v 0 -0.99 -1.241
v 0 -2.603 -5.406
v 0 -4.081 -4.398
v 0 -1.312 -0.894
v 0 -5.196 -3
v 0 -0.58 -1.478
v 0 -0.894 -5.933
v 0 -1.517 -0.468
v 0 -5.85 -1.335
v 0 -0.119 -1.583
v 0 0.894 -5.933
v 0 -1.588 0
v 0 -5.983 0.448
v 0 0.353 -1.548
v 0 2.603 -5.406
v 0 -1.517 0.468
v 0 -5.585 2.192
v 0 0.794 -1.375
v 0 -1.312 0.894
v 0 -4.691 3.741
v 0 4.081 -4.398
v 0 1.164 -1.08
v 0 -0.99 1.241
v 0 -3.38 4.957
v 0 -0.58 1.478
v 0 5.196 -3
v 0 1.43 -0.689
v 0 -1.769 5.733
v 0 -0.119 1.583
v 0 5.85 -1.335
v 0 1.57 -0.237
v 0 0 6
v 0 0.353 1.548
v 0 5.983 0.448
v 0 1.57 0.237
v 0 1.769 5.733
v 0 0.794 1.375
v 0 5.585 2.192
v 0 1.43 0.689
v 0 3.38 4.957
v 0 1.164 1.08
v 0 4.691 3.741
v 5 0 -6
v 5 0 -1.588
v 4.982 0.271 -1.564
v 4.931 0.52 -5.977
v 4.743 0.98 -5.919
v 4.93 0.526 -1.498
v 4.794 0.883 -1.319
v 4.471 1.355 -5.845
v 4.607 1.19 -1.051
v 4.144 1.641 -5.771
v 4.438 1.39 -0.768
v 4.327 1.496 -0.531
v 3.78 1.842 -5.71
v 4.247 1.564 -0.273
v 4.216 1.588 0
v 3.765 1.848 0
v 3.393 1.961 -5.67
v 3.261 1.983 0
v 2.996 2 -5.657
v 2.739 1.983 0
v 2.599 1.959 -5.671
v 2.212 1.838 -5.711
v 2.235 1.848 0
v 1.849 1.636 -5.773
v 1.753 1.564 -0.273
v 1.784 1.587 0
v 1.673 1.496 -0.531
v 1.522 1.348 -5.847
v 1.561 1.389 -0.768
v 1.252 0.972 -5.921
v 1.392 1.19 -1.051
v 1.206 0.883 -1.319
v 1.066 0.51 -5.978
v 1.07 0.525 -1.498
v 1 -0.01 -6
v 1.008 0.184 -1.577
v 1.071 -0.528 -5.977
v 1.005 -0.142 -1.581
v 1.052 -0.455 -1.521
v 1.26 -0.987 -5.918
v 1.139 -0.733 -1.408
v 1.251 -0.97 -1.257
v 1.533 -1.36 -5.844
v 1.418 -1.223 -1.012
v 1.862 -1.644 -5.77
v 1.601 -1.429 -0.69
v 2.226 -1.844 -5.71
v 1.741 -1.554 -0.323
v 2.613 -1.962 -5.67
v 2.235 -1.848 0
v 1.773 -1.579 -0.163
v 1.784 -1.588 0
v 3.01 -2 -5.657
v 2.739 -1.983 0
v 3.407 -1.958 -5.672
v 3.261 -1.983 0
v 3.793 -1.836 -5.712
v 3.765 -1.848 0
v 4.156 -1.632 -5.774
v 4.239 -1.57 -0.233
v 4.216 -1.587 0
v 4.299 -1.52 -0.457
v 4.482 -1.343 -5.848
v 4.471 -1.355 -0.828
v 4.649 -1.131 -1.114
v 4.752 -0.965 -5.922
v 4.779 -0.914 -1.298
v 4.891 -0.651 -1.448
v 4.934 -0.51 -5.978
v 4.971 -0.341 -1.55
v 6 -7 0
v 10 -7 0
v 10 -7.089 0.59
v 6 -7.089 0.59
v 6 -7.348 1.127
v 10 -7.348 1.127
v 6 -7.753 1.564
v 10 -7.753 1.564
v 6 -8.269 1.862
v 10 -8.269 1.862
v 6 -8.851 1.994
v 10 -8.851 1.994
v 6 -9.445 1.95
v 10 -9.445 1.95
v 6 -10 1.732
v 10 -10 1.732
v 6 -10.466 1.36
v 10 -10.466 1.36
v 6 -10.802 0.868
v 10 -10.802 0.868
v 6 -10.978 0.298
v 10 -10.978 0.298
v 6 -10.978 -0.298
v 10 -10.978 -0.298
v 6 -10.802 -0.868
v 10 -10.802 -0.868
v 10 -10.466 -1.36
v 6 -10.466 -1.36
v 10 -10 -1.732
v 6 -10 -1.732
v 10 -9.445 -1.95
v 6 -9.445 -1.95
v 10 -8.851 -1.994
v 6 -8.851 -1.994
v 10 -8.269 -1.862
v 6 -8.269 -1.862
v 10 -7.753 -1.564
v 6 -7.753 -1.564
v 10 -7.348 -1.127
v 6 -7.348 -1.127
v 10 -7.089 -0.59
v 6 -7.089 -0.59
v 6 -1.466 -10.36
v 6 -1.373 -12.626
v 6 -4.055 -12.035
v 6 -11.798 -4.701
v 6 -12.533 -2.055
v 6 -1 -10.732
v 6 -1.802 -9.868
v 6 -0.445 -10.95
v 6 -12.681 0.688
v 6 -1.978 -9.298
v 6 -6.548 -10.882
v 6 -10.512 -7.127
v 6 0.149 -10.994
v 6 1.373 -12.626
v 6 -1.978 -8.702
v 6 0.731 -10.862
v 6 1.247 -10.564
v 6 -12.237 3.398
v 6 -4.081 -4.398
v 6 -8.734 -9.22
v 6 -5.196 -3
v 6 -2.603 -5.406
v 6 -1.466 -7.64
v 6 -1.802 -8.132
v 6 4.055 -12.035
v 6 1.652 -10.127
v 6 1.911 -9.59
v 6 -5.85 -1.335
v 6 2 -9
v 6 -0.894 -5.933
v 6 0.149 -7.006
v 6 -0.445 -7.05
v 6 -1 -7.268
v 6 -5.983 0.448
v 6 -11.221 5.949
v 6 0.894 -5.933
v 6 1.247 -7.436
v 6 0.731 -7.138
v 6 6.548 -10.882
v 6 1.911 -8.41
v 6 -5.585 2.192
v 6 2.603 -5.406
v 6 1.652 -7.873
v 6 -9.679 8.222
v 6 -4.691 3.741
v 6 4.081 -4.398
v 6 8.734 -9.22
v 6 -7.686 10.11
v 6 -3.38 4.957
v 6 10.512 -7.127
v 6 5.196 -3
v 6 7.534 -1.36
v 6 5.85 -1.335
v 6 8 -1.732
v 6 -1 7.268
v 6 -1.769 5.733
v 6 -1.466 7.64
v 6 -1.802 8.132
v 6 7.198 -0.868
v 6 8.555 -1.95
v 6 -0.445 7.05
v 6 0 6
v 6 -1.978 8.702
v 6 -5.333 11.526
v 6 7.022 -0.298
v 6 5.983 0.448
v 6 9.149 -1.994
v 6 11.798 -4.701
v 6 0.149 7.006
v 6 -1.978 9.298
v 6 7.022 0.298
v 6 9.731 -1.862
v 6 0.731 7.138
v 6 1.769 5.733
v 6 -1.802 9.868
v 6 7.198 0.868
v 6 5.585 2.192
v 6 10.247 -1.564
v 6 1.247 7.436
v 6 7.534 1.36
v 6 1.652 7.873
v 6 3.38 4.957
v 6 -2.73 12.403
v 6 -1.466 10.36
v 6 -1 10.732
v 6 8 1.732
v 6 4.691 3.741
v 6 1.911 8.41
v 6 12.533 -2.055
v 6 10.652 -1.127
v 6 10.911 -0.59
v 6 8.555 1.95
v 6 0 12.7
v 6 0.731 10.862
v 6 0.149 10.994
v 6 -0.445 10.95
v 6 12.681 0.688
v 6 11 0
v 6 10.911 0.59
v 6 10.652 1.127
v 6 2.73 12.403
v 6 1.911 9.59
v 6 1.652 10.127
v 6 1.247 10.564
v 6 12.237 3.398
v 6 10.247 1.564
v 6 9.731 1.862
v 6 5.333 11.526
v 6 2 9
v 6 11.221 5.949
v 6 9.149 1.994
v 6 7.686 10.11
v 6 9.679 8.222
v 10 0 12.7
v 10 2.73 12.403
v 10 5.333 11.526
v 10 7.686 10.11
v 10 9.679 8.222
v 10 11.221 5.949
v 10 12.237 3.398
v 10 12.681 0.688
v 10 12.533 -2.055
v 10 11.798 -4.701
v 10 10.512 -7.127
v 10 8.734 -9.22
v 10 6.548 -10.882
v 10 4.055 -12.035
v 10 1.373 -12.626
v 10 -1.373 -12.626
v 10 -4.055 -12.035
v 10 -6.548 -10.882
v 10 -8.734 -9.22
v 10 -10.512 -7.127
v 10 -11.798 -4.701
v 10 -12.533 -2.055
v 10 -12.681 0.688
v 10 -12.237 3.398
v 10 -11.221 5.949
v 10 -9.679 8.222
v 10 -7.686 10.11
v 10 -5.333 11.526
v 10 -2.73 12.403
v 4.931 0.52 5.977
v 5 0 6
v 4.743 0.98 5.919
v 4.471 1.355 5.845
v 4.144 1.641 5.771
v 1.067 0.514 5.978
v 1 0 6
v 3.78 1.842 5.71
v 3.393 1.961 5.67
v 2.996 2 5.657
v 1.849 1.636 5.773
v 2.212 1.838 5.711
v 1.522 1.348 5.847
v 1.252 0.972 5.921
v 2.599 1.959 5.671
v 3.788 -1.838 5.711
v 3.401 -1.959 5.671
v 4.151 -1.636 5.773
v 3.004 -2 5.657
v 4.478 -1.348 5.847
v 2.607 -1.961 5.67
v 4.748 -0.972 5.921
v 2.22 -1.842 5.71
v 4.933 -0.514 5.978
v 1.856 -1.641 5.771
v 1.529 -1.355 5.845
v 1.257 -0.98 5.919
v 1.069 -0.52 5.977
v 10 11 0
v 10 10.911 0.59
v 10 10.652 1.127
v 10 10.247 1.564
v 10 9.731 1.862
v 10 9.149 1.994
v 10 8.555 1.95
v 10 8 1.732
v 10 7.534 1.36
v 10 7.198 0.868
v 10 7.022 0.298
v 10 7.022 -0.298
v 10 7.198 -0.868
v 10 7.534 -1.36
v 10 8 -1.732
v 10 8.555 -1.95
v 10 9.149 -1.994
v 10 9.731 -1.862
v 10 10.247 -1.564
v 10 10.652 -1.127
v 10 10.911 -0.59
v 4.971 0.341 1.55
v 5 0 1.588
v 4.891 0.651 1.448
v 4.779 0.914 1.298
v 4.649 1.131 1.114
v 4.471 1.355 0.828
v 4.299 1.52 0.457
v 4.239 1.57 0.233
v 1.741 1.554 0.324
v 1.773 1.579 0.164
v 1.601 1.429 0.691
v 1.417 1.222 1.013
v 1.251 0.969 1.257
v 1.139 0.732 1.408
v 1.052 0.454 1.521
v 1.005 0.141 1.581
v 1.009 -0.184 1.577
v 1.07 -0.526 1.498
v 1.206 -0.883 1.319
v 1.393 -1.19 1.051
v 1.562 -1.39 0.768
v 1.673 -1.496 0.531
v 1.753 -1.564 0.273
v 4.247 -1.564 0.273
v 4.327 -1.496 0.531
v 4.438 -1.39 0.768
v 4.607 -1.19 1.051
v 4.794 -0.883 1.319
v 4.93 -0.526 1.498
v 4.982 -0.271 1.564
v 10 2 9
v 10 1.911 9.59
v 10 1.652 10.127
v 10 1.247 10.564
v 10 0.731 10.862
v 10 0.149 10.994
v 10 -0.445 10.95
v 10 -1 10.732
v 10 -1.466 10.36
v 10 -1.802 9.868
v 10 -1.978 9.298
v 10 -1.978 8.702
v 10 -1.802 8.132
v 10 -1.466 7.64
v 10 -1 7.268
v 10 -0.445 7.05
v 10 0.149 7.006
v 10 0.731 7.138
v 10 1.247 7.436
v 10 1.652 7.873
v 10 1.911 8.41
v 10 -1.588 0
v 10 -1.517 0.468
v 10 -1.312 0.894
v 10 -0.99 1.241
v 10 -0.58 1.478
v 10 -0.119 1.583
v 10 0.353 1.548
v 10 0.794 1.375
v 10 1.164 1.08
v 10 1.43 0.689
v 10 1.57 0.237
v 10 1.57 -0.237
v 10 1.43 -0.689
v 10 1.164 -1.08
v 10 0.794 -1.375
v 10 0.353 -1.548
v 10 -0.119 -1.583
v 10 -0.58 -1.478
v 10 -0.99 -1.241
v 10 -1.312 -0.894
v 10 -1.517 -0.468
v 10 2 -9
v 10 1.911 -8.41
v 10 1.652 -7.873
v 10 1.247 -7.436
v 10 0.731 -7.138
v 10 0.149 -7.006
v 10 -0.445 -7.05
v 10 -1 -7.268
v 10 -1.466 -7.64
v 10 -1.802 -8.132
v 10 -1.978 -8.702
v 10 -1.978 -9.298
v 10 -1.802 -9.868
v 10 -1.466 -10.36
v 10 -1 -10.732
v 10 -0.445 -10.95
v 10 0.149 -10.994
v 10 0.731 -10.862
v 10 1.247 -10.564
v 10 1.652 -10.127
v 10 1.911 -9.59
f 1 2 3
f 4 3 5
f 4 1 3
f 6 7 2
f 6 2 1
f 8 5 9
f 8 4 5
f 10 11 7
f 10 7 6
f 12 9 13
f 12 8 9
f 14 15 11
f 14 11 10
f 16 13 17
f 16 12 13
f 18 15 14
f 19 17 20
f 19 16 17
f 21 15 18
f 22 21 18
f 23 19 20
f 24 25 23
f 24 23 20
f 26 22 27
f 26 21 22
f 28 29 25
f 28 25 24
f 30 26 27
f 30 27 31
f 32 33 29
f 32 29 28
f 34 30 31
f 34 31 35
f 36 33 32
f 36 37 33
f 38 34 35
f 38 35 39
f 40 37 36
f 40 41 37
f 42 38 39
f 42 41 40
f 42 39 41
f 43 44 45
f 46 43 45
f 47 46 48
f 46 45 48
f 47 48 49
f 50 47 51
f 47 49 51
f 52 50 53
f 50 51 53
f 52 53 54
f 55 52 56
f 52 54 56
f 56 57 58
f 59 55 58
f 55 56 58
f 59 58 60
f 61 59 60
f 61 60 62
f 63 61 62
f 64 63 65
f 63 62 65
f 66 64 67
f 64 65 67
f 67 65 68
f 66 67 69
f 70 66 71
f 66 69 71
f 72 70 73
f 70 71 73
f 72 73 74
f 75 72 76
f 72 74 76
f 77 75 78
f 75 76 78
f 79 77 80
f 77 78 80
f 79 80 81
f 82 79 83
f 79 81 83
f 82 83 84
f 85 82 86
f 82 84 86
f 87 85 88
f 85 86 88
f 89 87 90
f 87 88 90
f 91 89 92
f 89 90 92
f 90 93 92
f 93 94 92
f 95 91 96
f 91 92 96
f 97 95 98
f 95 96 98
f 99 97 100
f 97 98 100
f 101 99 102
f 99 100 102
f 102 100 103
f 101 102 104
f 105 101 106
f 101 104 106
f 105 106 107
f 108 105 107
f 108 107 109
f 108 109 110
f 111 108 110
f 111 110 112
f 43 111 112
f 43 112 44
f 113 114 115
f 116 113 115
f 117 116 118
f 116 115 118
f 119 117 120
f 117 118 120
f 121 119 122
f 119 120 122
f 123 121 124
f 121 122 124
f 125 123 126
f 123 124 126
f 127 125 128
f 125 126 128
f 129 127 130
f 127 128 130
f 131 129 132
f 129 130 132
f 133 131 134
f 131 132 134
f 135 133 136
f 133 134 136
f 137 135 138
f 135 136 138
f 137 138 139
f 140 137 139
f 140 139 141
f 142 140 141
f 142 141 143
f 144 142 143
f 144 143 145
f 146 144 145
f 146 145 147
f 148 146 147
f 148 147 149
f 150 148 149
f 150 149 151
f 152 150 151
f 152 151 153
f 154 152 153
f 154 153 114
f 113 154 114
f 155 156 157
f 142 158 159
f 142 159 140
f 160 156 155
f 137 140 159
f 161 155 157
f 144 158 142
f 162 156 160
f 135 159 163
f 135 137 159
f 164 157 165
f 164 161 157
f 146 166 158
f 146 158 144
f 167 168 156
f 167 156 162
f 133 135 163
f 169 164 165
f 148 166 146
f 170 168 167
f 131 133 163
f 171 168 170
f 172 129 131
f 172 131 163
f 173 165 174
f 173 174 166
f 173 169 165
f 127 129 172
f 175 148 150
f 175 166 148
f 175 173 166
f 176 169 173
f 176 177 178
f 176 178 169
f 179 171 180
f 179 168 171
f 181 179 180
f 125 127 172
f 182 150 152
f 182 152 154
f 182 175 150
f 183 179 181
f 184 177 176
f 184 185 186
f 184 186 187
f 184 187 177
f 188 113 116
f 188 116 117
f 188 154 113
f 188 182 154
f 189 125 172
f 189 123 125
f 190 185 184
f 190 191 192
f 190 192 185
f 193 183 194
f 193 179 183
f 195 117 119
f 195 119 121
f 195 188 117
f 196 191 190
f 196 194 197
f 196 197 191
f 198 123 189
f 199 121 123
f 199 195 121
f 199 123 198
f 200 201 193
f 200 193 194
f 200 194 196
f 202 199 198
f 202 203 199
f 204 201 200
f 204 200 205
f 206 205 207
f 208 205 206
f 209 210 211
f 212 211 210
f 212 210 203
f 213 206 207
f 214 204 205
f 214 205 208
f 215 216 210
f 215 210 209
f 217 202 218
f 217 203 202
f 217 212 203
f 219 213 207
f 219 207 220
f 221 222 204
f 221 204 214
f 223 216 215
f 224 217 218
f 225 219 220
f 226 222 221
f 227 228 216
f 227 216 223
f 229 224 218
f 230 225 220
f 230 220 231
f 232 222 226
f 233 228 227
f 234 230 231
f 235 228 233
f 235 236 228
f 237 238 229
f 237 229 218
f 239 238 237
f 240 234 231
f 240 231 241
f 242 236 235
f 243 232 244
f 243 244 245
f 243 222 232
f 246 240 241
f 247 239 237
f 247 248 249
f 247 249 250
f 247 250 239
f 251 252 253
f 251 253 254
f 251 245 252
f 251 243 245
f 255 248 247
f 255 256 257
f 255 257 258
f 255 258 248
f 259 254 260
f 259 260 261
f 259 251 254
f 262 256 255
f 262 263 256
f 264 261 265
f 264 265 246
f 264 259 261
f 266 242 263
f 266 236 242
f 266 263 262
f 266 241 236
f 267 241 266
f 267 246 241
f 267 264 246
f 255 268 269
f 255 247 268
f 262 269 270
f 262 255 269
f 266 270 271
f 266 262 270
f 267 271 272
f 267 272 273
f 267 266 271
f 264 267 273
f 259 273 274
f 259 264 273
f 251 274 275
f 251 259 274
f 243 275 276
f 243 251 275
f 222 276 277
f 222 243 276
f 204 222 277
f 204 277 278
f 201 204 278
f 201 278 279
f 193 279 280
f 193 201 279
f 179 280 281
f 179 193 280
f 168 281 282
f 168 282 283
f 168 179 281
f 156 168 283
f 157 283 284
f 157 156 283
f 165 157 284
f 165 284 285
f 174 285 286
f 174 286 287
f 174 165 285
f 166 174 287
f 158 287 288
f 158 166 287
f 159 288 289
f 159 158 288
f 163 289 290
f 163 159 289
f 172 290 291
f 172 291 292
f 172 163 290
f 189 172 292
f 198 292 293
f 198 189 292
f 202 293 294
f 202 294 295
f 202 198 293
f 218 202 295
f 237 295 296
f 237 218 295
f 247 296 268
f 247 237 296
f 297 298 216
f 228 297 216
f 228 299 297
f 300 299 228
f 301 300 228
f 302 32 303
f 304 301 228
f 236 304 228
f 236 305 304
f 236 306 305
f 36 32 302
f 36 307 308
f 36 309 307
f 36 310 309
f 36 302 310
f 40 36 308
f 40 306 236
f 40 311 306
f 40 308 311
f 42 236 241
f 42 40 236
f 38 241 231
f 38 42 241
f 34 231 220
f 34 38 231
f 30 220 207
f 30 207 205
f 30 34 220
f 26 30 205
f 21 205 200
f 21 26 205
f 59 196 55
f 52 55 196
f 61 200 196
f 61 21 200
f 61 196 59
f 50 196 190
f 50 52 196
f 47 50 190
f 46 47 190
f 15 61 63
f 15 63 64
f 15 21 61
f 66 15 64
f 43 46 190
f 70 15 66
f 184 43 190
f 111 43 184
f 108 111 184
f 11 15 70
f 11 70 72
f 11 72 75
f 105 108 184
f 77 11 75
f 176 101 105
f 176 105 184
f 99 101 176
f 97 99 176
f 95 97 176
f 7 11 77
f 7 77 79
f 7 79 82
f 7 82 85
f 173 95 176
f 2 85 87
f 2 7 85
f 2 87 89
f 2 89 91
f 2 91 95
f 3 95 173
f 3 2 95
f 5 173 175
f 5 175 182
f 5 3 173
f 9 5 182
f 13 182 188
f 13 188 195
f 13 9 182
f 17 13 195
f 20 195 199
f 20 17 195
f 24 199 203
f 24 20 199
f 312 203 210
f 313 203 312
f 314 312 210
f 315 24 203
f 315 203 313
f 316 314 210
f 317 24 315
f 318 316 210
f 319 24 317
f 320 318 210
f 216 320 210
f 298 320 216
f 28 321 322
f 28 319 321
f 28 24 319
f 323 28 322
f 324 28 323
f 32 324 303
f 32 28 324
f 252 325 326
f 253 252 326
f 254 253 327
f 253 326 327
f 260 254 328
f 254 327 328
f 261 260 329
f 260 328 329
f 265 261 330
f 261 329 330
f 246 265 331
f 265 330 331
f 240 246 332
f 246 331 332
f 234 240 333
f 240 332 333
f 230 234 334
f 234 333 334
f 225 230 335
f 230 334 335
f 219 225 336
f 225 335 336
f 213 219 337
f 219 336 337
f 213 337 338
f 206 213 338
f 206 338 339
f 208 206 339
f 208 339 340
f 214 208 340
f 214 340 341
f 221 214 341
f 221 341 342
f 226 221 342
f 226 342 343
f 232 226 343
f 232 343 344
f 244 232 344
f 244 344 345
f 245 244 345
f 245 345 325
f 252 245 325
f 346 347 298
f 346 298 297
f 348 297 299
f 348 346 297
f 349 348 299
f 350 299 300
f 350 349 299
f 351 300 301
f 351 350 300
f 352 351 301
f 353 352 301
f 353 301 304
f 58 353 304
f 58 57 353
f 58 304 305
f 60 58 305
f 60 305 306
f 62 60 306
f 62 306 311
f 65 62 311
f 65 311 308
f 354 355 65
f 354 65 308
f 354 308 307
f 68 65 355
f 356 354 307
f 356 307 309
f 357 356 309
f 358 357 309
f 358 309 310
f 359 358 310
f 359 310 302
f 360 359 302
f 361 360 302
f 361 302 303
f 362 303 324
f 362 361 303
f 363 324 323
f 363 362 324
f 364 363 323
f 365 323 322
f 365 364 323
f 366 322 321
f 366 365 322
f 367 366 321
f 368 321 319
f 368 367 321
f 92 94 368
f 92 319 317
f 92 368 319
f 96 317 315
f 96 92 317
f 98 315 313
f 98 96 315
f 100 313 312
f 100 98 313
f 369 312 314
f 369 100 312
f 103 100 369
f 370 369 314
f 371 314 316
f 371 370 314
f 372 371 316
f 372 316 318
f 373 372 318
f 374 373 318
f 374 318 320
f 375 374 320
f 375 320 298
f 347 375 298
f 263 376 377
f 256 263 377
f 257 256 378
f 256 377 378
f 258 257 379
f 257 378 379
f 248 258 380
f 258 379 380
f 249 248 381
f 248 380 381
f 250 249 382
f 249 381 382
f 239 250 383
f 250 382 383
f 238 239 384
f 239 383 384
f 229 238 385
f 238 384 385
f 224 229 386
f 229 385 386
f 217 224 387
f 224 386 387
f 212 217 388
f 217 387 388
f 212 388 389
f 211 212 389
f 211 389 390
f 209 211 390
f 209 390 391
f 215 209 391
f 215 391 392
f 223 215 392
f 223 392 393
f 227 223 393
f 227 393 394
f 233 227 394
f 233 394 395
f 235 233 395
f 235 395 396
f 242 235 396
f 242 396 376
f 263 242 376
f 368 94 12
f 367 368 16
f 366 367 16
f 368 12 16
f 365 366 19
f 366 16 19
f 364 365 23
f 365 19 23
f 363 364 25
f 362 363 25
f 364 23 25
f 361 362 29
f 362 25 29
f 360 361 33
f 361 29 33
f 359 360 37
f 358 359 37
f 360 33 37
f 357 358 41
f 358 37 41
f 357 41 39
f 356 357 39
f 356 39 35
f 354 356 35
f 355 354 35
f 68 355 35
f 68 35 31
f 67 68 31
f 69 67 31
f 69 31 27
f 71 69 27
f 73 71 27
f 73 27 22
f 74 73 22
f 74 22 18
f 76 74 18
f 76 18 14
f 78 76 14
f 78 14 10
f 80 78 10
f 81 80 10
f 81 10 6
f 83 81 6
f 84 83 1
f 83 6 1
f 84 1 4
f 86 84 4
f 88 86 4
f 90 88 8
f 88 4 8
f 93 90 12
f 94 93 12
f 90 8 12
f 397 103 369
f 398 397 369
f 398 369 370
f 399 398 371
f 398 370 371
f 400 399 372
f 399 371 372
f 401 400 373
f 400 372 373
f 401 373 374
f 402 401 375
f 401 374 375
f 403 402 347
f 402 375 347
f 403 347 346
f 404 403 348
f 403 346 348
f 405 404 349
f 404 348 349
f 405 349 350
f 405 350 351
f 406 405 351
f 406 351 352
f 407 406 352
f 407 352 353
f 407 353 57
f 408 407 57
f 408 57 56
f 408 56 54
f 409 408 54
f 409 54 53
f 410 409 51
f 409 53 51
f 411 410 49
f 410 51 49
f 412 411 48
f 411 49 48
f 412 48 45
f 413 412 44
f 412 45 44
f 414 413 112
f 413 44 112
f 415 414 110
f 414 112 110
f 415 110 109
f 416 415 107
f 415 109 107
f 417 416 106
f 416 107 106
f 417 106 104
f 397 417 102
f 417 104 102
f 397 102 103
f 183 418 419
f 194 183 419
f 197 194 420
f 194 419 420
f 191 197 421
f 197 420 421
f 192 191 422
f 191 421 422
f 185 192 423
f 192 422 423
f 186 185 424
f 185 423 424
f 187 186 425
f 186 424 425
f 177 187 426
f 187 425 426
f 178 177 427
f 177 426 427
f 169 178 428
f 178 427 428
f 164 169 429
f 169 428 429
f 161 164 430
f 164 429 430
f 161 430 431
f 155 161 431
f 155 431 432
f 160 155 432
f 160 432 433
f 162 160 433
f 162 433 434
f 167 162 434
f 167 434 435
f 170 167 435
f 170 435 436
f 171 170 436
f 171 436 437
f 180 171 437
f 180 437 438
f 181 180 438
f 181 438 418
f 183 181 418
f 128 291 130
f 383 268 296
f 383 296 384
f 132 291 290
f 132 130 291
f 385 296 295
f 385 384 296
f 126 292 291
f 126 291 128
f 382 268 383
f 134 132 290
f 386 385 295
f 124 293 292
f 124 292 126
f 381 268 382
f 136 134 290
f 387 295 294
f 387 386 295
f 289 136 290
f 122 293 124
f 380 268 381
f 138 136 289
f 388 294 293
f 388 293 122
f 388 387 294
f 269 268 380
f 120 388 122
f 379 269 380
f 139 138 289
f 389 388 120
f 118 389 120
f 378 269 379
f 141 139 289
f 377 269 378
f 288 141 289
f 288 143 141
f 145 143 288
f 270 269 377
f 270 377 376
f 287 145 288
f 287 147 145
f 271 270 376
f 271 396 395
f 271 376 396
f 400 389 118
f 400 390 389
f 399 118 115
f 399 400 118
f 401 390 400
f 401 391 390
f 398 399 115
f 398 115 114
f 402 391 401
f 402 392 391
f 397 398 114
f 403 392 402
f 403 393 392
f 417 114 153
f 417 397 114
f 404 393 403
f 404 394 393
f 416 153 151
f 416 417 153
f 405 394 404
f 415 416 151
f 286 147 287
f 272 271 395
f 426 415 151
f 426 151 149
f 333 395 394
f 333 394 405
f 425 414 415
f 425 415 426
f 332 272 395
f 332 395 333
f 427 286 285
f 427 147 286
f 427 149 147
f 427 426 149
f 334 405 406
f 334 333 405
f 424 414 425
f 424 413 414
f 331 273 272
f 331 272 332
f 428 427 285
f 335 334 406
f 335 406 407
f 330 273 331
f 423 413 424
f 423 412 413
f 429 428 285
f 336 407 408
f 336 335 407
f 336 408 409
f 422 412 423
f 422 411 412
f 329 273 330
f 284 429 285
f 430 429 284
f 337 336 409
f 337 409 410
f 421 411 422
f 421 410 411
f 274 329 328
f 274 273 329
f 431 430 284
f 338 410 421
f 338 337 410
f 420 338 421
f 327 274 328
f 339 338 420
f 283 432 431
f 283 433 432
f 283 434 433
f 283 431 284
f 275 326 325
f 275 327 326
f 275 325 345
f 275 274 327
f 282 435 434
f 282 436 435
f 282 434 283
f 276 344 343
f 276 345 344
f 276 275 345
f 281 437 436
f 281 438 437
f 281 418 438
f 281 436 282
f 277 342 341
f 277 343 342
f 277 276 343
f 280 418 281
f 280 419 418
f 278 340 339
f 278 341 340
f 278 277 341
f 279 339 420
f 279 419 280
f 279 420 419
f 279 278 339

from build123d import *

# Parameters (mm, degrees)
F2_R          = 2
F3_DEPTH      = 12.701
F3_DEPTH_BACK = 12.701
F4_R          = 2
F5_DEPTH      = 10.0010001
F6_R          = 1.5875
F7_DEPTH      = 10.001


with BuildPart() as f1:
    # F0 (on Front) → F1 (revolve)
    with BuildSketch(Plane.XZ):
        Polygon((0, 6), (0, 0), (10, 0), (10, 12.7), (6, 12.7), (6, 6), align=None)
    revolve(axis=Axis((5, 0, 0), (-1, 0, 0)))

    # F2 (on Top) → F3 (cut, two sides)
    with BuildSketch(Plane.XY) as f3_sk:
        with Locations((3, 0)):
            Circle(F2_R)
    extrude(amount=-F3_DEPTH, mode=Mode.SUBTRACT)
    extrude(f3_sk.sketch, amount=F3_DEPTH_BACK, mode=Mode.SUBTRACT)

    # F4 (on face) → F5 (cut, through all)
    with BuildSketch(Plane.YZ.offset(10)):
        with Locations((0, 9)):
            Circle(F4_R)
        with Locations((9, 0)):
            Circle(F4_R)
        with Locations((0, -9)):
            Circle(F4_R)
        with Locations((-9, 0)):
            Circle(F4_R)
    extrude(amount=-F5_DEPTH, mode=Mode.SUBTRACT)

    # F6 (on face) → F7 (cut, through all)
    with BuildSketch(Plane(origin=(0, 0, 0), x_dir=(0, -1, 0), z_dir=(-1, 0, 0))):
        Circle(F6_R)
    extrude(amount=-F7_DEPTH, mode=Mode.SUBTRACT)


solid = f1.part
